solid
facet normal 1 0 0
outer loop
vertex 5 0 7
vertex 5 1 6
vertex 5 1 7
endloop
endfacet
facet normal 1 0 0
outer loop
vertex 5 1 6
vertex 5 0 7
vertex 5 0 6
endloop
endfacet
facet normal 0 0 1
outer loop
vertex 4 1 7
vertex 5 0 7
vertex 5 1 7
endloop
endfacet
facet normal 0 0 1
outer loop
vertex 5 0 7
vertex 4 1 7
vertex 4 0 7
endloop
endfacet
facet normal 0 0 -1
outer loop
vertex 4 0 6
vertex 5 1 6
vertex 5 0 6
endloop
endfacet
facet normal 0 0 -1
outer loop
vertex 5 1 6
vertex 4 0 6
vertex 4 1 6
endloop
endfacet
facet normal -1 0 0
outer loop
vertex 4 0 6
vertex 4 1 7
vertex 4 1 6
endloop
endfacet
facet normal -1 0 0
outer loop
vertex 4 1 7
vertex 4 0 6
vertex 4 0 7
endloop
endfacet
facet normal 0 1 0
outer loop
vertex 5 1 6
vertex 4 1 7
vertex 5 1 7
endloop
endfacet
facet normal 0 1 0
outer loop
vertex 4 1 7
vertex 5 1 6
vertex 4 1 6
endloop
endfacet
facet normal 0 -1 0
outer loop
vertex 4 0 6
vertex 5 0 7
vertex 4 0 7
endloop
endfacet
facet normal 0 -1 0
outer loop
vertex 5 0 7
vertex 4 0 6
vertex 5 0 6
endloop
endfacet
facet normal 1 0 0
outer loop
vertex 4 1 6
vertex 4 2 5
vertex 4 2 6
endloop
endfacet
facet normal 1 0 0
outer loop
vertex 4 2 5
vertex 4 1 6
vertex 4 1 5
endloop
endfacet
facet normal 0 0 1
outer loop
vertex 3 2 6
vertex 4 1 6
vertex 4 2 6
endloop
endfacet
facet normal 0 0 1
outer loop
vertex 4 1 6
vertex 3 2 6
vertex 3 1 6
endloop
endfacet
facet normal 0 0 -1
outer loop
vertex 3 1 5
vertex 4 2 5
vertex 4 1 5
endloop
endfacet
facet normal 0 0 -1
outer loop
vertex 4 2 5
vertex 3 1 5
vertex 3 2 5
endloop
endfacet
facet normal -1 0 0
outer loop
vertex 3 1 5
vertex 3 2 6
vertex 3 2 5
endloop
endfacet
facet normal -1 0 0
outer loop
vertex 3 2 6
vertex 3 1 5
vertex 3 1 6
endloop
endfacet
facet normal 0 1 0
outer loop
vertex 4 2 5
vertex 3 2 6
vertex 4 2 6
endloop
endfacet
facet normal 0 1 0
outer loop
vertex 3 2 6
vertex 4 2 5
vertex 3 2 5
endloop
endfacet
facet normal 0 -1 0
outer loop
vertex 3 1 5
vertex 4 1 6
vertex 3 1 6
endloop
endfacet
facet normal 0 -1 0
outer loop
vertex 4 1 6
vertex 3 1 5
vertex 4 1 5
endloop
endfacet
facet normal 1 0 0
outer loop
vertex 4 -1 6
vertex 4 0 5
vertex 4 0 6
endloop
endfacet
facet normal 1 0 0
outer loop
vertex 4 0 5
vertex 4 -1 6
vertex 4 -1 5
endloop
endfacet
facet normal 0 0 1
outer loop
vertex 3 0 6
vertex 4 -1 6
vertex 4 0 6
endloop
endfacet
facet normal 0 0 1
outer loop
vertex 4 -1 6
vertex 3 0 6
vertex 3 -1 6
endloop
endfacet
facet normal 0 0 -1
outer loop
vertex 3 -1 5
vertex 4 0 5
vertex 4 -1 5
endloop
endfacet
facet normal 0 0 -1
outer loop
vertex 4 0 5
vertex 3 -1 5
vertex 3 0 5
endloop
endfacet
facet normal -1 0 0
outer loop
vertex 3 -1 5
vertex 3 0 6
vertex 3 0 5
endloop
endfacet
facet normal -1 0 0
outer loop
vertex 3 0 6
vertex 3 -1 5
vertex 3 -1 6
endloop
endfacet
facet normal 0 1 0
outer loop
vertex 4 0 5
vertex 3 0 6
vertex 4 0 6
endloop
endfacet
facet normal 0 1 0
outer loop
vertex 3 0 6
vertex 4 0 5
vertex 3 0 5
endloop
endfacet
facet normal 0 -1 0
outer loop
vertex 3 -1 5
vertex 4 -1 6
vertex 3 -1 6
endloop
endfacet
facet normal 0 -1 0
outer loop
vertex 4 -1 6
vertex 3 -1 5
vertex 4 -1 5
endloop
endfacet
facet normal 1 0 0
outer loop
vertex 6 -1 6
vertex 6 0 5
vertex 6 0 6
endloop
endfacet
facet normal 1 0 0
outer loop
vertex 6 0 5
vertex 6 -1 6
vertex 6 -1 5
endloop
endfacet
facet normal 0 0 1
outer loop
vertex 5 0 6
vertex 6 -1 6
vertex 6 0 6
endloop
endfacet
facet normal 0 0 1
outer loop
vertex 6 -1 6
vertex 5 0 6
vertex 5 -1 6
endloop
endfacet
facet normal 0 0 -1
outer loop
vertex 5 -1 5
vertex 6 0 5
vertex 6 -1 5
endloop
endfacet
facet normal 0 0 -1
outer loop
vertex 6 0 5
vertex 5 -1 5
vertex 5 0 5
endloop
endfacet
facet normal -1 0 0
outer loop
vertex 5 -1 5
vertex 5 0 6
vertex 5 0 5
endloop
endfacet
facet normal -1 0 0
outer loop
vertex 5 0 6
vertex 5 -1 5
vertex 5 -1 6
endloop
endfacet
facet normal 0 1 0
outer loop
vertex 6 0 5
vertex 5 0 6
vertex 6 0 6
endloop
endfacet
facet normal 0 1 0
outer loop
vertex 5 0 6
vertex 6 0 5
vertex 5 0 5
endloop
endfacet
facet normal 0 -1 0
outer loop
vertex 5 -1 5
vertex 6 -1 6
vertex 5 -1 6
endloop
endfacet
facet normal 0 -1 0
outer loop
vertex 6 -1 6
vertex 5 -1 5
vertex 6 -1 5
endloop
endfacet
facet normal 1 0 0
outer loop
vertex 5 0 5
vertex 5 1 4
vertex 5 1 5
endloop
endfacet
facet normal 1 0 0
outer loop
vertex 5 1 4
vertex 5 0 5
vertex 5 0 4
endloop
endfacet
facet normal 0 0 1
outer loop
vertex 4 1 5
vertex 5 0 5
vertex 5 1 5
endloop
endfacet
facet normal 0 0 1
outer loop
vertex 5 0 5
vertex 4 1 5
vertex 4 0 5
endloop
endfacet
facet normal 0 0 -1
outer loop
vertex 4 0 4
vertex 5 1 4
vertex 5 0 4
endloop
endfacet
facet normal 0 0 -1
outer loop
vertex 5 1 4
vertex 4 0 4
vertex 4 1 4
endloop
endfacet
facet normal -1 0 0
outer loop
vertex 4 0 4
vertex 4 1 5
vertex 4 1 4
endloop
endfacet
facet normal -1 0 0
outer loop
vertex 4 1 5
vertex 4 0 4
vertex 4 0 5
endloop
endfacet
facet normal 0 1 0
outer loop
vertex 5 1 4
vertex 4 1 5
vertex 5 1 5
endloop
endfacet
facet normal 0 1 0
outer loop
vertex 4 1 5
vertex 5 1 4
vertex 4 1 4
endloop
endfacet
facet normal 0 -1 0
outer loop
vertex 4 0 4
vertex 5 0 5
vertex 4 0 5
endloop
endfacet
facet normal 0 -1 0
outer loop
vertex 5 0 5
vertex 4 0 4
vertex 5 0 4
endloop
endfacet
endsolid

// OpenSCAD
module space ()
{
  translate([4, 0, 6]) { cube(1); }
  translate([3, 1, 5]) { cube(1); }
  translate([3, -1, 5]) { cube(1); }
  translate([5, -1, 5]) { cube(1); }
  translate([4, 0, 4]) { cube(1); }
}

space();
